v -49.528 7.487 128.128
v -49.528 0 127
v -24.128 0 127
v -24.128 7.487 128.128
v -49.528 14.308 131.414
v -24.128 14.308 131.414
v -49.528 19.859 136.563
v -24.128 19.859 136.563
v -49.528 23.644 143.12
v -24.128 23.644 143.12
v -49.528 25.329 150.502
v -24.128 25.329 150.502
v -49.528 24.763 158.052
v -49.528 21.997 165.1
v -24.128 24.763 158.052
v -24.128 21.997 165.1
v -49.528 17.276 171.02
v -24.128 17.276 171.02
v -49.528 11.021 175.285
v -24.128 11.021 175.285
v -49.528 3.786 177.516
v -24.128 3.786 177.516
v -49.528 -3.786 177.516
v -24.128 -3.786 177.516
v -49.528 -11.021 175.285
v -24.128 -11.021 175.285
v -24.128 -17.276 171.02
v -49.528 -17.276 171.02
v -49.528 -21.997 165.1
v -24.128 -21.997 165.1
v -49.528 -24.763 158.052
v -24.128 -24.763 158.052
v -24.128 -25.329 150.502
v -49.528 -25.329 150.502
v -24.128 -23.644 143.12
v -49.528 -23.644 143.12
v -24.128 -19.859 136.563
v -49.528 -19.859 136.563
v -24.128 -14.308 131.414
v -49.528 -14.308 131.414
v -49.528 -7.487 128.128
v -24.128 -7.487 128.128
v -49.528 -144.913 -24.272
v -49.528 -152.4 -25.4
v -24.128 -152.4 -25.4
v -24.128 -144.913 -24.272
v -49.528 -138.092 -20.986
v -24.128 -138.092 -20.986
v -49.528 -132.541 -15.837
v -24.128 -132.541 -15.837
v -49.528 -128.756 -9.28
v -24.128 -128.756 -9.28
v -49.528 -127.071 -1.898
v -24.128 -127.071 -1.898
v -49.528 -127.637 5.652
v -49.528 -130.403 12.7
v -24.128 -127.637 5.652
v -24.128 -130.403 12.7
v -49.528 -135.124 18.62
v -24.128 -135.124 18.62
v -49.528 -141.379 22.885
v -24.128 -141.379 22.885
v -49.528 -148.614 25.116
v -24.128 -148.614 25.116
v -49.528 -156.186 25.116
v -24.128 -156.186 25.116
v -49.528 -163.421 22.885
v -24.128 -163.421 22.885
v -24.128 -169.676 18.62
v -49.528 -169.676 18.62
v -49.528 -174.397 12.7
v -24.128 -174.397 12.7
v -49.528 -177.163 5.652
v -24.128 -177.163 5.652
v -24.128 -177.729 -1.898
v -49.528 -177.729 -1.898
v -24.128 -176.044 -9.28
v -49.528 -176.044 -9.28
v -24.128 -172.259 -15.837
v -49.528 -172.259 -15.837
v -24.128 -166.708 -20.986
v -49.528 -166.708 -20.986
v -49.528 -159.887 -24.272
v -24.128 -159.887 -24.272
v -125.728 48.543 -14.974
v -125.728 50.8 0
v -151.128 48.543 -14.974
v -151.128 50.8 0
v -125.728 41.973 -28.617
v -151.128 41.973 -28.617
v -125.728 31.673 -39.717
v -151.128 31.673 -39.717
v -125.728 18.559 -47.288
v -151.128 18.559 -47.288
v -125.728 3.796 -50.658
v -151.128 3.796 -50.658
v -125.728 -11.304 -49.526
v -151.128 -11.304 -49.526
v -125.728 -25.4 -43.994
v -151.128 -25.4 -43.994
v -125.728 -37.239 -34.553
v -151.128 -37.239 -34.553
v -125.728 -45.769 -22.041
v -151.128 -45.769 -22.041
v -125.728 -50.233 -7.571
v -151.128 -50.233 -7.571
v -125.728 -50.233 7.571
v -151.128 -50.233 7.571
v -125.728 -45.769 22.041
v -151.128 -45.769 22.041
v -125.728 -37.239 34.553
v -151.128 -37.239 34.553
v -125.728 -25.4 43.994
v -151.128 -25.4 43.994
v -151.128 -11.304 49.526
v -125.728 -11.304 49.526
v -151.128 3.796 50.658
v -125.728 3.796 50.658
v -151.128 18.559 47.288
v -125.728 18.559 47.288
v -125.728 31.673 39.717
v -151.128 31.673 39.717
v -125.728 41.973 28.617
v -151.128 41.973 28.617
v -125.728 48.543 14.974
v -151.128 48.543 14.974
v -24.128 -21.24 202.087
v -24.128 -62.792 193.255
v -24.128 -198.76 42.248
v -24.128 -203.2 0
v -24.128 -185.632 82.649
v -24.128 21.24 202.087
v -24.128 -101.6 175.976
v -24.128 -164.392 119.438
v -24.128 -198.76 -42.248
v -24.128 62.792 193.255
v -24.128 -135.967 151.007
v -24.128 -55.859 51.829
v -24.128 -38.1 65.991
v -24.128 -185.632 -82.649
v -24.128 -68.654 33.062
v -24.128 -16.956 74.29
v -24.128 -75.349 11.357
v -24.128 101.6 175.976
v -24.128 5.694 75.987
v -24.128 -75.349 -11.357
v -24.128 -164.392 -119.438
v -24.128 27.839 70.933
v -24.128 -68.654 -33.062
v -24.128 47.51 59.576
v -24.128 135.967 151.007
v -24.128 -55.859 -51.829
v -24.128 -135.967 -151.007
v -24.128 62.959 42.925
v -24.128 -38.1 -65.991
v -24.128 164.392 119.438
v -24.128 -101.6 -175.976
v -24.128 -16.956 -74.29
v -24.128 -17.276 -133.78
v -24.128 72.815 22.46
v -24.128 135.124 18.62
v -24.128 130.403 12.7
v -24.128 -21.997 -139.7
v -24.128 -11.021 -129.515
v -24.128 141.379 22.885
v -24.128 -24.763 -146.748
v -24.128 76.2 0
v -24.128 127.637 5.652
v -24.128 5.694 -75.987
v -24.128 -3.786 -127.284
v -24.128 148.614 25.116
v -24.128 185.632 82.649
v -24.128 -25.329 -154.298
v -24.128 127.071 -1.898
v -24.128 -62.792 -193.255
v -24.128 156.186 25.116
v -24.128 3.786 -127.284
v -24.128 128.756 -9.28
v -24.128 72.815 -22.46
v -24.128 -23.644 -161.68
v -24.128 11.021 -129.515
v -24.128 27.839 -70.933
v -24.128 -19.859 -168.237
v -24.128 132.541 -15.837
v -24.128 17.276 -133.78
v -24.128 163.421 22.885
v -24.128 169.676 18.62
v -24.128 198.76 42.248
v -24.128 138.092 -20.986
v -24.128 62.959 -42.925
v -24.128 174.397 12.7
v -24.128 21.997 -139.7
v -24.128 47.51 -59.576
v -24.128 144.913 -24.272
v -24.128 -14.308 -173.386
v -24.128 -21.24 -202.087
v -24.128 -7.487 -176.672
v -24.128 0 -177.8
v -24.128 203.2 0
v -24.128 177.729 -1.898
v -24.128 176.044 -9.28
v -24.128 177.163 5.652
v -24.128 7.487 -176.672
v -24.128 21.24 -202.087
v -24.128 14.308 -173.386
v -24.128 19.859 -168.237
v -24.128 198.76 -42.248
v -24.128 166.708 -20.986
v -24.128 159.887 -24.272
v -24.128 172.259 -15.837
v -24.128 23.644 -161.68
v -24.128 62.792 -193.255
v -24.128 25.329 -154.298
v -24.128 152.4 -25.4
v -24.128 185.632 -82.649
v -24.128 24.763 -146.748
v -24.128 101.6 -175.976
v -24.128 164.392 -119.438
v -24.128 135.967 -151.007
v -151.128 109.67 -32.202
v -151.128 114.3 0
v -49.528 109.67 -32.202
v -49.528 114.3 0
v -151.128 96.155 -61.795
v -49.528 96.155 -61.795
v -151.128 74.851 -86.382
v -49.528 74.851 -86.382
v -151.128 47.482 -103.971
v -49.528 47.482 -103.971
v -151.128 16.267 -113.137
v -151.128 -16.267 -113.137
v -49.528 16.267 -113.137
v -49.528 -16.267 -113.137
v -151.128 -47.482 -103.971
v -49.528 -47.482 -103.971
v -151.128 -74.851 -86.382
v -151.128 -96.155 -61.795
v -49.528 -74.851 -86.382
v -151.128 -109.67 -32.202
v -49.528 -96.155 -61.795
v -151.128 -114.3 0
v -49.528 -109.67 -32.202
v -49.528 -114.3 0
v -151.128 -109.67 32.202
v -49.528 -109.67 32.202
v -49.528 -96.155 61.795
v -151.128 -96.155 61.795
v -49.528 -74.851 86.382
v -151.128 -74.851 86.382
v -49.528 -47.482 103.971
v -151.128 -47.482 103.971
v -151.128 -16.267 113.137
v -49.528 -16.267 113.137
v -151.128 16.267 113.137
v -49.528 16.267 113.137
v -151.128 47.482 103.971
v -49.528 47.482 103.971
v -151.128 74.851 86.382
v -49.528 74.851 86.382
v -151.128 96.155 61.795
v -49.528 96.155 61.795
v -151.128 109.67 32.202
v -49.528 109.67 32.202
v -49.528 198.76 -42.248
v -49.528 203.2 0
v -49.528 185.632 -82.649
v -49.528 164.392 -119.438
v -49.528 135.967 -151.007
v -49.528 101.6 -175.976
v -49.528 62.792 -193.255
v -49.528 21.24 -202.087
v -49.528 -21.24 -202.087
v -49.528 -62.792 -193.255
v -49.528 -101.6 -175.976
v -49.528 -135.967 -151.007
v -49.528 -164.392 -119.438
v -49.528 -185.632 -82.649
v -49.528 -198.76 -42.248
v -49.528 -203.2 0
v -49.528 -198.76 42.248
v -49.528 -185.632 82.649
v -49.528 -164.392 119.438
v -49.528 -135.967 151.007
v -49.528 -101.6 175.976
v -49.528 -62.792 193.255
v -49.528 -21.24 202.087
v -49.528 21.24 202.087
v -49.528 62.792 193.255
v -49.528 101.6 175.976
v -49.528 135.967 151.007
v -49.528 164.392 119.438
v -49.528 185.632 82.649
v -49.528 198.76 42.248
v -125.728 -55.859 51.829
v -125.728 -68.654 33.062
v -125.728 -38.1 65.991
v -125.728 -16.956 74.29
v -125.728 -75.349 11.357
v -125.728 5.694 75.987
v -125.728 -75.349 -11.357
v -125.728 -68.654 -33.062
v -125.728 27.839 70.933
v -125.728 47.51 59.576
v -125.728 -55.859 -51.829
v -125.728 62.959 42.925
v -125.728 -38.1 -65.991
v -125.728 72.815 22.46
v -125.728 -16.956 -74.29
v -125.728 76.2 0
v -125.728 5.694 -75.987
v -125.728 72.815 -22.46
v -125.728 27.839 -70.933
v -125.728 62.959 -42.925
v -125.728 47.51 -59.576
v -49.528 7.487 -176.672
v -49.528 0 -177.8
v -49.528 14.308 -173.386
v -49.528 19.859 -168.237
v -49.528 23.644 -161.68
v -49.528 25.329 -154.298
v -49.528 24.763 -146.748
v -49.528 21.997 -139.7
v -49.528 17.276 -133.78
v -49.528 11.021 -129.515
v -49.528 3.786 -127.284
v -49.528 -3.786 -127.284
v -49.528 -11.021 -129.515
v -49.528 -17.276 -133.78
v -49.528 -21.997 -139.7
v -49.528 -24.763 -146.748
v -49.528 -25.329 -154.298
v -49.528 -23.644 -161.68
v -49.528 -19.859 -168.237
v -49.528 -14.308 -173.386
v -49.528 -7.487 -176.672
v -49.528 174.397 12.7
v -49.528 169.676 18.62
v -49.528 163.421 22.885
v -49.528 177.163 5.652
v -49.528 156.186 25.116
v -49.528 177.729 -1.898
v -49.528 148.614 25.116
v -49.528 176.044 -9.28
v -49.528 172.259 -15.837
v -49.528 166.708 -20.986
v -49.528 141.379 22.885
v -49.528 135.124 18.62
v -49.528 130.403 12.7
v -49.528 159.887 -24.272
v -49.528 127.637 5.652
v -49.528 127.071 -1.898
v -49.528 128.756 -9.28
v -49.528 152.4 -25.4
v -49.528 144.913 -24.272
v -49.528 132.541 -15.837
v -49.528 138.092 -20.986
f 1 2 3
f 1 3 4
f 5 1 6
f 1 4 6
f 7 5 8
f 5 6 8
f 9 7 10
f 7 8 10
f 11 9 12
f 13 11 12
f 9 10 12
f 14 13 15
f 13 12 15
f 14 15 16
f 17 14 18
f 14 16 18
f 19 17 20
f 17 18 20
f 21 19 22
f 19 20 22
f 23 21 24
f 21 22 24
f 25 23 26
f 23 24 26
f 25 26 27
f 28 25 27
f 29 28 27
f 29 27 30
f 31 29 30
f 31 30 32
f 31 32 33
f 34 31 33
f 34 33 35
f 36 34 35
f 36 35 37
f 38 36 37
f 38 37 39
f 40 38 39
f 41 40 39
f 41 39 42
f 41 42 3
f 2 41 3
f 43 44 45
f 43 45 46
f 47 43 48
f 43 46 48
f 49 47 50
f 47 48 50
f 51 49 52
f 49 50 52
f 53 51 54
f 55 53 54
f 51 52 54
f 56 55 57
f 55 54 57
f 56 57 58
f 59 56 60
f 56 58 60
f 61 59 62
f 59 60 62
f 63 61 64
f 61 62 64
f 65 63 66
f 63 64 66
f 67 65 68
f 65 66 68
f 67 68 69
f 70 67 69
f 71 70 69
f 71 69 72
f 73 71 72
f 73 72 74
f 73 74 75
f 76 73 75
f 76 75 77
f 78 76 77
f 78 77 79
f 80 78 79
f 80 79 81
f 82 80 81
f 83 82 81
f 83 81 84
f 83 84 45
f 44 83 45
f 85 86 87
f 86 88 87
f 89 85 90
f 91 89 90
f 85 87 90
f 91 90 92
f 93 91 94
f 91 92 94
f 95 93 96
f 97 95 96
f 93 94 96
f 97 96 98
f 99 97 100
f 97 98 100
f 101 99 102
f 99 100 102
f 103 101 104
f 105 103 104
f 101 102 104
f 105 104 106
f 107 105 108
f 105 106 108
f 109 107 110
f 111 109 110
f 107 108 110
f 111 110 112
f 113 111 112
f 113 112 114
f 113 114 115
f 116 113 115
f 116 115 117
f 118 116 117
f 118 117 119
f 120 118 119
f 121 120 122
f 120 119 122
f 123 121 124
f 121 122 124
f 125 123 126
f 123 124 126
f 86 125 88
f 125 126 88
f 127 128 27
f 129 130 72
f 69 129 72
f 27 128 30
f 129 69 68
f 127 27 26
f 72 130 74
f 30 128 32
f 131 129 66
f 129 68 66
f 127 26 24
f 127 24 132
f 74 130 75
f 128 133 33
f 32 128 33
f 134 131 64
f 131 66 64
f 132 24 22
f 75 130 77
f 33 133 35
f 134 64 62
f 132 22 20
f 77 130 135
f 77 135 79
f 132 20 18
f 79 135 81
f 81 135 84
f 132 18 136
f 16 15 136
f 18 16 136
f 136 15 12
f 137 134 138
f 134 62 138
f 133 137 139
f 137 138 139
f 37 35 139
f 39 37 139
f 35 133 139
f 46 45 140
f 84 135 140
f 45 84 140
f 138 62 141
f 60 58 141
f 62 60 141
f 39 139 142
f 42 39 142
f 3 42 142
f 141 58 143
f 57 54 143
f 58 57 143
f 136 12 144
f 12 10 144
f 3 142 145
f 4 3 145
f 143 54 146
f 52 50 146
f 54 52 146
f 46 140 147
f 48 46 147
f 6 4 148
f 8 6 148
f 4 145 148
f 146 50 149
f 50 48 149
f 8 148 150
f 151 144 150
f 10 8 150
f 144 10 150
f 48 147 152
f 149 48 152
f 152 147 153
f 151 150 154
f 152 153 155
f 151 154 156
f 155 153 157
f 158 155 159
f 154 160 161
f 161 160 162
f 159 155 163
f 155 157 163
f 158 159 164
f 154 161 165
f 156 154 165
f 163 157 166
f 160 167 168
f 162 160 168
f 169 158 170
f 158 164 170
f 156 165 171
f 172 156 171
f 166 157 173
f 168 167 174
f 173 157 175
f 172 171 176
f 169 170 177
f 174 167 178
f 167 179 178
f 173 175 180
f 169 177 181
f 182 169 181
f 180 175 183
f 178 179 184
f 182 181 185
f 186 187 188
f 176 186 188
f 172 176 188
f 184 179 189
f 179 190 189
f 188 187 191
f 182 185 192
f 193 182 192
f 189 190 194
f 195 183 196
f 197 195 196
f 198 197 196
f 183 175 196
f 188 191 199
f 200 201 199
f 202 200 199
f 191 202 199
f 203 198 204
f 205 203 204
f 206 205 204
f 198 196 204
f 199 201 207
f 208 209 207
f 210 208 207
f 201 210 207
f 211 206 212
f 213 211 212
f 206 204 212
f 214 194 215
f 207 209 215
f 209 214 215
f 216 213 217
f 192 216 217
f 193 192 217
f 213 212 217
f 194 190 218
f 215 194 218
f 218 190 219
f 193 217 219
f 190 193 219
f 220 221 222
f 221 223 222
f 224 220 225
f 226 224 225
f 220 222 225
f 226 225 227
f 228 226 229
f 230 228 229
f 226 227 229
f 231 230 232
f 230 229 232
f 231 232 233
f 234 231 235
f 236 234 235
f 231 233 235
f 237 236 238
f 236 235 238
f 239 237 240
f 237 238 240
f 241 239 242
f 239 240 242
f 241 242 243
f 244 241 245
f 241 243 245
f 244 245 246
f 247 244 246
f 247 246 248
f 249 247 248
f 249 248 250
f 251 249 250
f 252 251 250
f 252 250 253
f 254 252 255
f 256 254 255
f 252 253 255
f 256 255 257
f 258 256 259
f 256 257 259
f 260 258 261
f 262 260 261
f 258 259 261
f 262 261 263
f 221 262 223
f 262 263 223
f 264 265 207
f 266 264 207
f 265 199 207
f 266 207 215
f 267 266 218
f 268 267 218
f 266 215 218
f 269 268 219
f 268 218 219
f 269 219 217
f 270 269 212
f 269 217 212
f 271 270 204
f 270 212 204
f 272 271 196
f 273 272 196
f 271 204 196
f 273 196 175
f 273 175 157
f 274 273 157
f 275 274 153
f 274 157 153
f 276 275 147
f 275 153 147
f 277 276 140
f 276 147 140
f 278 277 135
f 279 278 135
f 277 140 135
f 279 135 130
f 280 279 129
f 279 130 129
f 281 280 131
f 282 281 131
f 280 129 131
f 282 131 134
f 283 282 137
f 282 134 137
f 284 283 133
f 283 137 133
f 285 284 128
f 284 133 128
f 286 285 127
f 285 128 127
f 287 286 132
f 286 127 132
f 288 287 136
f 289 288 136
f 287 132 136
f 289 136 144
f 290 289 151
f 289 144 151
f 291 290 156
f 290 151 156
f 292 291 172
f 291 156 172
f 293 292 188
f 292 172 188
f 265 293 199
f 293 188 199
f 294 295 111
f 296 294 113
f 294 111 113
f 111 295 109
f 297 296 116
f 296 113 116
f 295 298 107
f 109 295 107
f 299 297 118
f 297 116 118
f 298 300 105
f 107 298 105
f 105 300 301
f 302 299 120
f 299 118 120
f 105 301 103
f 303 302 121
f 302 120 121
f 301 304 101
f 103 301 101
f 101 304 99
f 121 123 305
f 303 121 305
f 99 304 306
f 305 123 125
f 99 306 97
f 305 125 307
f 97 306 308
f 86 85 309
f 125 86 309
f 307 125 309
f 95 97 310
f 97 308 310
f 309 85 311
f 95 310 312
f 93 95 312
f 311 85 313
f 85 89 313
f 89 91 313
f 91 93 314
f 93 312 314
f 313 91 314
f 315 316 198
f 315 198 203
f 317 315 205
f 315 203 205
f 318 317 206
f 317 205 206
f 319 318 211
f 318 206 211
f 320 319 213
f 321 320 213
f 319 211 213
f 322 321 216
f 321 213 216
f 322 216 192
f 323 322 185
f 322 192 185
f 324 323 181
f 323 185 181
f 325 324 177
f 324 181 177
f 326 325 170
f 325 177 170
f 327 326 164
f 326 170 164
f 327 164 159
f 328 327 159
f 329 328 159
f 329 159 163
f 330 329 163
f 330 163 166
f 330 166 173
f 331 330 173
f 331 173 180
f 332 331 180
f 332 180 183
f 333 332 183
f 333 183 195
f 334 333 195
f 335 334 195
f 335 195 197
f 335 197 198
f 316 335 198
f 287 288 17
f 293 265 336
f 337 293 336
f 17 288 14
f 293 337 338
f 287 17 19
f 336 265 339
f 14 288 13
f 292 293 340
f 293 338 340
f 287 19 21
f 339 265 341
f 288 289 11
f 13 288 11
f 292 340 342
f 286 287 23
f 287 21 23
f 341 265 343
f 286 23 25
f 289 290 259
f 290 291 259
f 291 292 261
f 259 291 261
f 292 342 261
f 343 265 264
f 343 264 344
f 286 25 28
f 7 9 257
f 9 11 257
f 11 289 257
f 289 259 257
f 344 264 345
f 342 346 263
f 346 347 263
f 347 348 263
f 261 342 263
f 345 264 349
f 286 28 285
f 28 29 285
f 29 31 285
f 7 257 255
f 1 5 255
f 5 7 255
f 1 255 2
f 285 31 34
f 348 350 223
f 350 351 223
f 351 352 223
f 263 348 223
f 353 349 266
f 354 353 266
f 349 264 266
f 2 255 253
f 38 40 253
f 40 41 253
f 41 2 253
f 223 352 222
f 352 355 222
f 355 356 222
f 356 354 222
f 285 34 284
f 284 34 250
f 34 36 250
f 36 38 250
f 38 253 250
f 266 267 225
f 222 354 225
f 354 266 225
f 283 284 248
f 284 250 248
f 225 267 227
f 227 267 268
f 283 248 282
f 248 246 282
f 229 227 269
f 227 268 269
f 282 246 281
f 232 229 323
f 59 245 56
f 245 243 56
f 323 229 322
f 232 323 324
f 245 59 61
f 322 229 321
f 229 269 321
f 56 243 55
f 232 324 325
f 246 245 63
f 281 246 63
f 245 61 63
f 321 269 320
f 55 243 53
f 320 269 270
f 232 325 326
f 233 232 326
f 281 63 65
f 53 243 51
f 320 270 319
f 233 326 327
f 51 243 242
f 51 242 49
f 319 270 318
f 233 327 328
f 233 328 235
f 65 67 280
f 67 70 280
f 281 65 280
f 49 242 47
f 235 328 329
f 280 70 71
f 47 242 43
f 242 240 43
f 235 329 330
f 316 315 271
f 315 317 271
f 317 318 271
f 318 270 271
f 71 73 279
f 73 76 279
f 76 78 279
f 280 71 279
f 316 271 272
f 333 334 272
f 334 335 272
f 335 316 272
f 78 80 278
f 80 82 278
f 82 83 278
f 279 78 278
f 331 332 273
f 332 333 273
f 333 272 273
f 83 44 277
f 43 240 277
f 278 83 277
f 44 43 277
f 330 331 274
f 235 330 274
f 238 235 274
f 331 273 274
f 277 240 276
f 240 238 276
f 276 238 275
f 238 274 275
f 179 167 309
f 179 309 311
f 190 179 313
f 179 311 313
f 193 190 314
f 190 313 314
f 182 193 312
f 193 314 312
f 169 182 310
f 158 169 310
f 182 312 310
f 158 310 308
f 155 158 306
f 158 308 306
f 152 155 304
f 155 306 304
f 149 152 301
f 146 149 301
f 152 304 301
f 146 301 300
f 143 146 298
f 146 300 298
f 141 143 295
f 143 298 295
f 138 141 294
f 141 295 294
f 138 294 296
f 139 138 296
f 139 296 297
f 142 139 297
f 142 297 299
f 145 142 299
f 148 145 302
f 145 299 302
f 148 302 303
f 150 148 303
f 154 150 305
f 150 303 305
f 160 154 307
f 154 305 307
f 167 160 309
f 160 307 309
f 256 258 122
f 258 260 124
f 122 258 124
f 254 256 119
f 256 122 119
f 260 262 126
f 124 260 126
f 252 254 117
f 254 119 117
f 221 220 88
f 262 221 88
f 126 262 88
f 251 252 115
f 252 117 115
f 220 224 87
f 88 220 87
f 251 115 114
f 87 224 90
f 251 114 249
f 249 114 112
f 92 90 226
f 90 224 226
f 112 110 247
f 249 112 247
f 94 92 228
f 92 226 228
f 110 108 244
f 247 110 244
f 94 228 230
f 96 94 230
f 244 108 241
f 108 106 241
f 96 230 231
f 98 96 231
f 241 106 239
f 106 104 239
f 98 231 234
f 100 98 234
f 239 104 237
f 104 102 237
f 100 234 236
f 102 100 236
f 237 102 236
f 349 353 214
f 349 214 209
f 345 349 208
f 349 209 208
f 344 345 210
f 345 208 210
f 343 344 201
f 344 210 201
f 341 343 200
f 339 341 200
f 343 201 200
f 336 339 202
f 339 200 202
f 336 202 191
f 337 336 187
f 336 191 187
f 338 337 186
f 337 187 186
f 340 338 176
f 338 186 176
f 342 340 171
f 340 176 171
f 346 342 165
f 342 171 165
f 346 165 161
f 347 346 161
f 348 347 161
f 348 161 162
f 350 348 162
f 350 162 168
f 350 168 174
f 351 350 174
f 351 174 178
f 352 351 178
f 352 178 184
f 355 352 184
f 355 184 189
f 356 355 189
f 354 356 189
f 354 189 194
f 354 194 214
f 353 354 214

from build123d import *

# Parameters (mm, degrees)
SKETCH2_R          = 25.4
CUT_EXTRUDE1_DEPTH = 128


with BuildPart() as part:
    # Sketch1 → Revolve1 (revolve)
    with BuildSketch(Plane.XY):
        Polygon((-151.127552987, 114.3), (-49.527552987, 114.3), (-49.527552987, 203.2), (-24.127552987, 203.2), (-24.127552987, 76.2), (-125.727552987, 76.2), (-125.727552987, 50.8), (-151.127552987, 50.8), align=None)
    revolve(axis=Axis((0, 0, 0), (-1, 0, 0)))

    # Sketch2 → Cut-Extrude1 (cut, through all)
    with BuildSketch(Plane(origin=(-24.127552987, 0, 0), x_dir=(0, 0, -1), z_dir=(1, 0, 0))):
        with Locations((0, 152.4)):
            Circle(SKETCH2_R)
        with Locations((-152.4, 0)):
            Circle(SKETCH2_R)
        with Locations((152.4, 0)):
            Circle(SKETCH2_R)
        with Locations((0, -152.4)):
            Circle(SKETCH2_R)
    extrude(amount=-CUT_EXTRUDE1_DEPTH, mode=Mode.SUBTRACT)


solid = part.part
